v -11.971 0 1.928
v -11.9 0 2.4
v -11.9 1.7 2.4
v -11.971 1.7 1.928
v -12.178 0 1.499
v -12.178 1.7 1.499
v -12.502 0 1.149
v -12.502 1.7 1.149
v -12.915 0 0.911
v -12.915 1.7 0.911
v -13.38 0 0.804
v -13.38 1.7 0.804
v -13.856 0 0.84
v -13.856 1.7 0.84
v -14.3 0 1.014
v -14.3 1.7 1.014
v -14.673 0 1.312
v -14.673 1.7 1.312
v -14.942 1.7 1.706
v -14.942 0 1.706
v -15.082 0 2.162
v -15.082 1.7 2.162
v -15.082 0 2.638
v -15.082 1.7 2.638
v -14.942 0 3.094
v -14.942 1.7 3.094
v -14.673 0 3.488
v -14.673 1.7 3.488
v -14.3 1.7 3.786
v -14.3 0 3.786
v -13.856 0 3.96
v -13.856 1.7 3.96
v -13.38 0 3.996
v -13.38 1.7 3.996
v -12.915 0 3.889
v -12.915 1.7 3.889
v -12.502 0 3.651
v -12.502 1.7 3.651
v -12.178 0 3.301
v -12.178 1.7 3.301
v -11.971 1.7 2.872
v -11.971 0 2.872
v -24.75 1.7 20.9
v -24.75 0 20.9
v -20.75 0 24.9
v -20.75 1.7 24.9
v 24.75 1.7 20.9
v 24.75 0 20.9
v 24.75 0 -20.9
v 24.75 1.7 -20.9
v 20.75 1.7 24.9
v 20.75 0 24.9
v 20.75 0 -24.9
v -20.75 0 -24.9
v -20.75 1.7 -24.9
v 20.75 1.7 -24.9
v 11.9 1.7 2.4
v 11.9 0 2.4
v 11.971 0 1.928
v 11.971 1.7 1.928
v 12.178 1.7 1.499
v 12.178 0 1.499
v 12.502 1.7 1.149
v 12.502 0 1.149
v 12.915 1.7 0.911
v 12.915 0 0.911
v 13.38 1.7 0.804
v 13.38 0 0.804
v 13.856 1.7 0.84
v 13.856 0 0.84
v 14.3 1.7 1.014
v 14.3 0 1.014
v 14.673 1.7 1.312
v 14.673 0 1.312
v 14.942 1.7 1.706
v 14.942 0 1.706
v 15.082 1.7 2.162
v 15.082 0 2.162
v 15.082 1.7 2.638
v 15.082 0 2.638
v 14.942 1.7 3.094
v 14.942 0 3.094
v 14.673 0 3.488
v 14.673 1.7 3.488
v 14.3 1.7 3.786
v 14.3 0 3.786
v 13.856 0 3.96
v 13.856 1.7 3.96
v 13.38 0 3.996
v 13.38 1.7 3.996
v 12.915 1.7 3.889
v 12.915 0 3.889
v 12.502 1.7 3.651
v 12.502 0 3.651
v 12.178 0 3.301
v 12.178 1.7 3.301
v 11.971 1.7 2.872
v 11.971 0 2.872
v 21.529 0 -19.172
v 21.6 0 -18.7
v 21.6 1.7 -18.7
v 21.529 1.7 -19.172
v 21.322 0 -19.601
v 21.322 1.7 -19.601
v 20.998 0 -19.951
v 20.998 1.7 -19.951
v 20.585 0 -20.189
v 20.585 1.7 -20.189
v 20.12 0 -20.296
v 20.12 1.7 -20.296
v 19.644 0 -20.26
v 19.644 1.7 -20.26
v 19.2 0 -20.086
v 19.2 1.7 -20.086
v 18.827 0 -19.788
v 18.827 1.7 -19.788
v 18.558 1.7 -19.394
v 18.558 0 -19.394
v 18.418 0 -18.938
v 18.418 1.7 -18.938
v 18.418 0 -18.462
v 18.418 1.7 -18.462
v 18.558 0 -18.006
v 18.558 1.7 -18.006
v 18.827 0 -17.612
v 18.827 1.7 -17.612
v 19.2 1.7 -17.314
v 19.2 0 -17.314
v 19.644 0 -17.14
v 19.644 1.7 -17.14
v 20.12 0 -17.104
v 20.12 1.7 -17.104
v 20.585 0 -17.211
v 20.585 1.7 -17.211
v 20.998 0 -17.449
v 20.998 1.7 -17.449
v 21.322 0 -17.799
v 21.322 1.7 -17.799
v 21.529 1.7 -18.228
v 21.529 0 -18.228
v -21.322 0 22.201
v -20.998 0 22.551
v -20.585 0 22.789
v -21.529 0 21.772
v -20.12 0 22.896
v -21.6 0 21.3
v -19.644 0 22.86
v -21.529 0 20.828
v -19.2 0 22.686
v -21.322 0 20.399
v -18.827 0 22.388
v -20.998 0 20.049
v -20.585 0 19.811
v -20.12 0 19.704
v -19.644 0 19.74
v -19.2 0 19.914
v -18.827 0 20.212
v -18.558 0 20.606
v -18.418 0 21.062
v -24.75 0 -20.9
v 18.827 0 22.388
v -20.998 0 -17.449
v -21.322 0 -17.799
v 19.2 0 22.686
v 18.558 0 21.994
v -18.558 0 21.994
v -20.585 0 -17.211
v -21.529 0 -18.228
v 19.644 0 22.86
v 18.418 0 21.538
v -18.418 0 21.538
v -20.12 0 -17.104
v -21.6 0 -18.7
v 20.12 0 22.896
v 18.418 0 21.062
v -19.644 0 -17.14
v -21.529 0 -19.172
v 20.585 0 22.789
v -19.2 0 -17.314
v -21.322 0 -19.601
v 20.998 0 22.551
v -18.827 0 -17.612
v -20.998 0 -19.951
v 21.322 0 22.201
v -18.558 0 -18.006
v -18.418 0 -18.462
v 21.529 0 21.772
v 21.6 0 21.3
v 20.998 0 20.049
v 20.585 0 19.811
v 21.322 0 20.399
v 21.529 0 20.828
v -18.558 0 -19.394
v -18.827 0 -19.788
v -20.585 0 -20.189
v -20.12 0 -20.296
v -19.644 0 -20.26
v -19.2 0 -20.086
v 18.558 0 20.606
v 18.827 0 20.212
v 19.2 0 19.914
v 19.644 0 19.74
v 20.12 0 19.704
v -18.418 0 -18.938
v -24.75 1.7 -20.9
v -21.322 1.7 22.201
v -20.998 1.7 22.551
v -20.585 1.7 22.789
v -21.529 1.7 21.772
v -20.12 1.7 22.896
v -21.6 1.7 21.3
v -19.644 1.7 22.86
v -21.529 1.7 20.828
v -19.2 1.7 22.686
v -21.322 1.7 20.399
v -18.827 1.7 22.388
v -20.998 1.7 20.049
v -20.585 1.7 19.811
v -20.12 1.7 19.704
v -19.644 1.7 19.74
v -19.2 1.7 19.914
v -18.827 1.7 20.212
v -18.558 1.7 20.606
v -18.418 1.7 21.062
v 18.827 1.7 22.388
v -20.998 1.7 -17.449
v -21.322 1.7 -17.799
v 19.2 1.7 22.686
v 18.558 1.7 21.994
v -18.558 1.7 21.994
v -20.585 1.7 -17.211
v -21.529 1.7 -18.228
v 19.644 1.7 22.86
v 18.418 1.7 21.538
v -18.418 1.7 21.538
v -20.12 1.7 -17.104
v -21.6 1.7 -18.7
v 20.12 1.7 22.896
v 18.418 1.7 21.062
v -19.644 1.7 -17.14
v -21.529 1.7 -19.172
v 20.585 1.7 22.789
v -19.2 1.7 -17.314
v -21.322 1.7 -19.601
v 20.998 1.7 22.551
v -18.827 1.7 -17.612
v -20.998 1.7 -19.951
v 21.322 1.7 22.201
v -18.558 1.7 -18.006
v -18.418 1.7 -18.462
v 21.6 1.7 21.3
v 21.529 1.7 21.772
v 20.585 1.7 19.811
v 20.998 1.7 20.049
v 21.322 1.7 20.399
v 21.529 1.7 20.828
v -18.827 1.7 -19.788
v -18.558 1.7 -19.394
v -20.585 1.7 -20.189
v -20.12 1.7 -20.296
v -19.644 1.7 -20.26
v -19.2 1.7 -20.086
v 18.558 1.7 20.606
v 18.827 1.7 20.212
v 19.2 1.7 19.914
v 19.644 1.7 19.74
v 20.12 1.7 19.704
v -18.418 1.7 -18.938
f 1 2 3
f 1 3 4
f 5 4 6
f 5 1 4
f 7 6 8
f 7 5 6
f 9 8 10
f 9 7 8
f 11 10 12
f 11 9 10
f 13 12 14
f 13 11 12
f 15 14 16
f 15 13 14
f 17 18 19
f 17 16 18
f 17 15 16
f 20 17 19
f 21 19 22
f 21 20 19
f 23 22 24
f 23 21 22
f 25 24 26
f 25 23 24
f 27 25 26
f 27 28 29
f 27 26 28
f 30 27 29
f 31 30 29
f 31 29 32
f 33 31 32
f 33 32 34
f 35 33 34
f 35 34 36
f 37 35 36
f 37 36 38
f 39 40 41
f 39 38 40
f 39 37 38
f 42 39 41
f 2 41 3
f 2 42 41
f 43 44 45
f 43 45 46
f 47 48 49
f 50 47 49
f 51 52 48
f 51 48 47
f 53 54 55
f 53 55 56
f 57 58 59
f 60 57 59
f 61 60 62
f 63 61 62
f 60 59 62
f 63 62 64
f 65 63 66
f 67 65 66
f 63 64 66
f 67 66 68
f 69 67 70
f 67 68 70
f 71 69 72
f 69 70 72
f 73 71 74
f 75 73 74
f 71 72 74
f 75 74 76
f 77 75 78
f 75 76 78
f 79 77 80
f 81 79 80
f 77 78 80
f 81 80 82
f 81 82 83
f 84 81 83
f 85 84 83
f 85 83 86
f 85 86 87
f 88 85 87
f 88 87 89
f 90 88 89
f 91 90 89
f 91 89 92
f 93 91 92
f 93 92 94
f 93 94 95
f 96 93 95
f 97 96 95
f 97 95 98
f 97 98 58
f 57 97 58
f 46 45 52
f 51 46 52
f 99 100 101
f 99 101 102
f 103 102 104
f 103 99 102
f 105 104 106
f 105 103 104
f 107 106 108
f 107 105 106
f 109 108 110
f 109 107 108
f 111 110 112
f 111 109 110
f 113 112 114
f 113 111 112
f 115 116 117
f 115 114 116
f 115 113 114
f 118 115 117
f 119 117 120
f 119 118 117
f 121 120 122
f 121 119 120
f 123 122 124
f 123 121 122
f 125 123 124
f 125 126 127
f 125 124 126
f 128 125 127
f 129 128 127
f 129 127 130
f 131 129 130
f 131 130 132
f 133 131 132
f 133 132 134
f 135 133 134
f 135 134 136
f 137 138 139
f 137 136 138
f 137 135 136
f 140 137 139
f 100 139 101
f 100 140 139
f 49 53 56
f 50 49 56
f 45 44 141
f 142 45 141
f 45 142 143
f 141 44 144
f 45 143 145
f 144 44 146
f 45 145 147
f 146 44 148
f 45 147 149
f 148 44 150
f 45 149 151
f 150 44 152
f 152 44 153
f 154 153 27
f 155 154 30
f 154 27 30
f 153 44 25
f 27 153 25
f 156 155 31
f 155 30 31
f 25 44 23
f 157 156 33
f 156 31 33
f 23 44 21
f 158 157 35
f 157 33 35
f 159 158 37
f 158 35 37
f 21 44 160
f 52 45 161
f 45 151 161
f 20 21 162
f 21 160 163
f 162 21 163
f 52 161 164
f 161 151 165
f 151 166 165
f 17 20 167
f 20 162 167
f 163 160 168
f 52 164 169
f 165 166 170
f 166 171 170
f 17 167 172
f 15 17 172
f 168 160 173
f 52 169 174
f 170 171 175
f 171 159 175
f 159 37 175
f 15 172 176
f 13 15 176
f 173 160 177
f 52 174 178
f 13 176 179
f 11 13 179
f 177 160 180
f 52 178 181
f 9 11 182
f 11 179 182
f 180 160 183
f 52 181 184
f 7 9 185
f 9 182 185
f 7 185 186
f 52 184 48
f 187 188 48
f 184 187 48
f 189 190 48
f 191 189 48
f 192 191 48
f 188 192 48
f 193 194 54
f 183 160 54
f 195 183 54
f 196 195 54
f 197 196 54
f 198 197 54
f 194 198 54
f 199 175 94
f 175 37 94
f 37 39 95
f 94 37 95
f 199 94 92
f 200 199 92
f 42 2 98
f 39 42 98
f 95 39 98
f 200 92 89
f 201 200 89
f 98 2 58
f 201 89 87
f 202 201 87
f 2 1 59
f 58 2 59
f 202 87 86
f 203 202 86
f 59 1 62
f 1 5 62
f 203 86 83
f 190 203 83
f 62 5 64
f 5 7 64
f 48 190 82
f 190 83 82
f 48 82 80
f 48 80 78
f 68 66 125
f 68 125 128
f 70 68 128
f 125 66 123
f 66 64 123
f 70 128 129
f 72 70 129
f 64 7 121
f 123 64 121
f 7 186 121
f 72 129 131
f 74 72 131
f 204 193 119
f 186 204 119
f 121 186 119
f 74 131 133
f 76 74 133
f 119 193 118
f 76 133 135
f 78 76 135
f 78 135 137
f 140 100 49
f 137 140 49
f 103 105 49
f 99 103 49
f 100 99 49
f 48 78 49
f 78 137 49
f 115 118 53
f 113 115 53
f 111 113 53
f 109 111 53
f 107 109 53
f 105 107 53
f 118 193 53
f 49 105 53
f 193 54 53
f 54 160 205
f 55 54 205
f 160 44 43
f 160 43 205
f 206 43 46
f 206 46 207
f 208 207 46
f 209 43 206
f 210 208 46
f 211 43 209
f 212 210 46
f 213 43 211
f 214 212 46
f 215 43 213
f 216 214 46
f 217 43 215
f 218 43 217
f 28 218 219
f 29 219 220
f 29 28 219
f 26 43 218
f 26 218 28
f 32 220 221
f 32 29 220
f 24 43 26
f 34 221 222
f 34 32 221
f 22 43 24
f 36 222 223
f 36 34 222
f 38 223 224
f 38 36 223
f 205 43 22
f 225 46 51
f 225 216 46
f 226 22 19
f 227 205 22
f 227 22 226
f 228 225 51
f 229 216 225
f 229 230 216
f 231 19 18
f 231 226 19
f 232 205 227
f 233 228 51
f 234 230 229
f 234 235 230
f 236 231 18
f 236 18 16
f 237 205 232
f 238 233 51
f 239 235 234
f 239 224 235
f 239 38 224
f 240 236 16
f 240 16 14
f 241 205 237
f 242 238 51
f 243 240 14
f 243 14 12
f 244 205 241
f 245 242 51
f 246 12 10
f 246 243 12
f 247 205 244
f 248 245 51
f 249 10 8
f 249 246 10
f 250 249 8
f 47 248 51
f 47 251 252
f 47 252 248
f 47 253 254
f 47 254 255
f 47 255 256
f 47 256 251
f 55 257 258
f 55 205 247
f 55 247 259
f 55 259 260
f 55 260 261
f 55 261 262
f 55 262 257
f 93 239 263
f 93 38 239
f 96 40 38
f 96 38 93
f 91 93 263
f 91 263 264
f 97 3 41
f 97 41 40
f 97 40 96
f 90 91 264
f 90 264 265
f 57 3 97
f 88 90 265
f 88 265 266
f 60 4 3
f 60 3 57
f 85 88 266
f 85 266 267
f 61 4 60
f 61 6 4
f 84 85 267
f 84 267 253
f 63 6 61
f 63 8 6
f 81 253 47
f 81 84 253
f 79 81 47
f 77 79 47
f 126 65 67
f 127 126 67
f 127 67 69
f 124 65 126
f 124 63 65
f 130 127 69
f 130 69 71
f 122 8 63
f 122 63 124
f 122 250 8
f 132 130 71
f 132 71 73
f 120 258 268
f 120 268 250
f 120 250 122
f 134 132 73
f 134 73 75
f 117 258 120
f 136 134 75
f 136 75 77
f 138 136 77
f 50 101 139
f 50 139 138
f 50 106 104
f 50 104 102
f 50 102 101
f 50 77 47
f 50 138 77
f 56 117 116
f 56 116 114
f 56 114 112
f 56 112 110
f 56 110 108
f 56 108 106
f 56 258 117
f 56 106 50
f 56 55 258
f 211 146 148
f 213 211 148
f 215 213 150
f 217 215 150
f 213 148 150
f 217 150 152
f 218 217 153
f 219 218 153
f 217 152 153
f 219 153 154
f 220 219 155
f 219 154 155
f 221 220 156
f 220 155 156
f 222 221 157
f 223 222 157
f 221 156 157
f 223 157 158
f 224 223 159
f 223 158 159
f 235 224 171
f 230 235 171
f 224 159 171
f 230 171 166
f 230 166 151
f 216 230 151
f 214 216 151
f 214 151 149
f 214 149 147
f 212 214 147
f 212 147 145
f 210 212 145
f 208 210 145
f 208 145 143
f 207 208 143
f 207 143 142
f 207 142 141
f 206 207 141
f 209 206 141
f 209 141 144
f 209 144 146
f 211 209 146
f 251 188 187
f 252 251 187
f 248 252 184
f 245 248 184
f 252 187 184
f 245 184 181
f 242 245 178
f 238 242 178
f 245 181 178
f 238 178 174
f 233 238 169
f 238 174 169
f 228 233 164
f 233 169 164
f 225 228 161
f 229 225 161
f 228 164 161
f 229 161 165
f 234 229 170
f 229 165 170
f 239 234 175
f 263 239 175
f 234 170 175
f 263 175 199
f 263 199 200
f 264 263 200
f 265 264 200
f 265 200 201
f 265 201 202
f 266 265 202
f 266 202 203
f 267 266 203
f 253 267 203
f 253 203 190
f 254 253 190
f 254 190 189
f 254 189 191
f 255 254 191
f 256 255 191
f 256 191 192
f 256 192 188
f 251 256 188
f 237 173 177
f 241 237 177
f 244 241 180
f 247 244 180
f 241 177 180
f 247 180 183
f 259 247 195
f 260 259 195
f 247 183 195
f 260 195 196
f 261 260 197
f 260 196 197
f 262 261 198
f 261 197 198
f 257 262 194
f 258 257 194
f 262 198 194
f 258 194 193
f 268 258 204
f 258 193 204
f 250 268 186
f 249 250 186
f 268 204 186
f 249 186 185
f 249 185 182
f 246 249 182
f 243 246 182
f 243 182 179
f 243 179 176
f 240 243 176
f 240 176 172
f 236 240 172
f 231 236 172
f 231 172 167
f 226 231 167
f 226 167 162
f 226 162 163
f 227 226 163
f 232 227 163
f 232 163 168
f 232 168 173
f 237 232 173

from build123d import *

# Parameters (mm, degrees)
SKETCH1_W            = 49.5
SKETCH1_H            = 49.8
BOSS_EXTRUDE1_DEPTH  = 1.7
M3_CLEARANCE_HOLE1_D = 3.2
LPATTERN1_COUNT      = 2
LPATTERN1_PITCH      = 40
LPATTERN1_COPY_1_D   = 3.2
M3_CLEARANCE_HOLE2_D = 3.2
CHAMFER1_SIZE        = 4


with BuildPart() as part:
    # Sketch1 → Boss-Extrude1 (new body)
    with BuildSketch(Plane(origin=(0, 0, 0), x_dir=(1, 0, 0), z_dir=(0, 1, 0))):
        Rectangle(SKETCH1_W, SKETCH1_H)
    extrude(amount=BOSS_EXTRUDE1_DEPTH)

    # M3 Clearance Hole1 (through all)
    with Locations(Plane(origin=(0, 1.7, 0), x_dir=(1, 0, 0), z_dir=(0, 1, 0))):
        with Locations((-20, 18.7)):
            m3_clearance_hole1 = Hole(M3_CLEARANCE_HOLE1_D / 2)

    # Mirror1: M3 Clearance Hole1 across plane
    add(m3_clearance_hole1.mirror(Plane(origin=(0, 0, 0), x_dir=(0, 0, 1), z_dir=(1, 0, 0))), mode=Mode.SUBTRACT)

    # LPattern1: M3 Clearance Hole1 ×2
    with Locations(*[(0, 0, i * LPATTERN1_PITCH) for i in range(1, LPATTERN1_COUNT)]):
        add(m3_clearance_hole1, mode=Mode.SUBTRACT)

    # LPattern1 copy 1 (through all)
    with Locations(Plane(origin=(0, 1.7, 40), x_dir=(-1, 0, 0), z_dir=(0, 1, 0))):
        with Locations((-20, -18.7)):
            Hole(LPATTERN1_COPY_1_D / 2)

    # M3 Clearance Hole2 (through all)
    with Locations(Plane(origin=(0, 1.7, 0), x_dir=(1, 0, 0), z_dir=(0, 1, 0))):
        with Locations((13.5, -2.4)):
            m3_clearance_hole2 = Hole(M3_CLEARANCE_HOLE2_D / 2)

    # Mirror3: M3 Clearance Hole2 across plane
    add(m3_clearance_hole2.mirror(Plane(origin=(0, 0, 0), x_dir=(0, 0, 1), z_dir=(1, 0, 0))), mode=Mode.SUBTRACT)

    # Chamfer1
    chamfer1_edges = [part.edges().sort_by_distance(p)[0] for p in [
        (24.75, 0.85, 24.9),
        (-24.75, 0.85, 24.9),
        (-24.75, 0.85, -24.9),
        (24.75, 0.85, -24.9),
    ]]
    chamfer(chamfer1_edges, length=CHAMFER1_SIZE)


solid = part.part
